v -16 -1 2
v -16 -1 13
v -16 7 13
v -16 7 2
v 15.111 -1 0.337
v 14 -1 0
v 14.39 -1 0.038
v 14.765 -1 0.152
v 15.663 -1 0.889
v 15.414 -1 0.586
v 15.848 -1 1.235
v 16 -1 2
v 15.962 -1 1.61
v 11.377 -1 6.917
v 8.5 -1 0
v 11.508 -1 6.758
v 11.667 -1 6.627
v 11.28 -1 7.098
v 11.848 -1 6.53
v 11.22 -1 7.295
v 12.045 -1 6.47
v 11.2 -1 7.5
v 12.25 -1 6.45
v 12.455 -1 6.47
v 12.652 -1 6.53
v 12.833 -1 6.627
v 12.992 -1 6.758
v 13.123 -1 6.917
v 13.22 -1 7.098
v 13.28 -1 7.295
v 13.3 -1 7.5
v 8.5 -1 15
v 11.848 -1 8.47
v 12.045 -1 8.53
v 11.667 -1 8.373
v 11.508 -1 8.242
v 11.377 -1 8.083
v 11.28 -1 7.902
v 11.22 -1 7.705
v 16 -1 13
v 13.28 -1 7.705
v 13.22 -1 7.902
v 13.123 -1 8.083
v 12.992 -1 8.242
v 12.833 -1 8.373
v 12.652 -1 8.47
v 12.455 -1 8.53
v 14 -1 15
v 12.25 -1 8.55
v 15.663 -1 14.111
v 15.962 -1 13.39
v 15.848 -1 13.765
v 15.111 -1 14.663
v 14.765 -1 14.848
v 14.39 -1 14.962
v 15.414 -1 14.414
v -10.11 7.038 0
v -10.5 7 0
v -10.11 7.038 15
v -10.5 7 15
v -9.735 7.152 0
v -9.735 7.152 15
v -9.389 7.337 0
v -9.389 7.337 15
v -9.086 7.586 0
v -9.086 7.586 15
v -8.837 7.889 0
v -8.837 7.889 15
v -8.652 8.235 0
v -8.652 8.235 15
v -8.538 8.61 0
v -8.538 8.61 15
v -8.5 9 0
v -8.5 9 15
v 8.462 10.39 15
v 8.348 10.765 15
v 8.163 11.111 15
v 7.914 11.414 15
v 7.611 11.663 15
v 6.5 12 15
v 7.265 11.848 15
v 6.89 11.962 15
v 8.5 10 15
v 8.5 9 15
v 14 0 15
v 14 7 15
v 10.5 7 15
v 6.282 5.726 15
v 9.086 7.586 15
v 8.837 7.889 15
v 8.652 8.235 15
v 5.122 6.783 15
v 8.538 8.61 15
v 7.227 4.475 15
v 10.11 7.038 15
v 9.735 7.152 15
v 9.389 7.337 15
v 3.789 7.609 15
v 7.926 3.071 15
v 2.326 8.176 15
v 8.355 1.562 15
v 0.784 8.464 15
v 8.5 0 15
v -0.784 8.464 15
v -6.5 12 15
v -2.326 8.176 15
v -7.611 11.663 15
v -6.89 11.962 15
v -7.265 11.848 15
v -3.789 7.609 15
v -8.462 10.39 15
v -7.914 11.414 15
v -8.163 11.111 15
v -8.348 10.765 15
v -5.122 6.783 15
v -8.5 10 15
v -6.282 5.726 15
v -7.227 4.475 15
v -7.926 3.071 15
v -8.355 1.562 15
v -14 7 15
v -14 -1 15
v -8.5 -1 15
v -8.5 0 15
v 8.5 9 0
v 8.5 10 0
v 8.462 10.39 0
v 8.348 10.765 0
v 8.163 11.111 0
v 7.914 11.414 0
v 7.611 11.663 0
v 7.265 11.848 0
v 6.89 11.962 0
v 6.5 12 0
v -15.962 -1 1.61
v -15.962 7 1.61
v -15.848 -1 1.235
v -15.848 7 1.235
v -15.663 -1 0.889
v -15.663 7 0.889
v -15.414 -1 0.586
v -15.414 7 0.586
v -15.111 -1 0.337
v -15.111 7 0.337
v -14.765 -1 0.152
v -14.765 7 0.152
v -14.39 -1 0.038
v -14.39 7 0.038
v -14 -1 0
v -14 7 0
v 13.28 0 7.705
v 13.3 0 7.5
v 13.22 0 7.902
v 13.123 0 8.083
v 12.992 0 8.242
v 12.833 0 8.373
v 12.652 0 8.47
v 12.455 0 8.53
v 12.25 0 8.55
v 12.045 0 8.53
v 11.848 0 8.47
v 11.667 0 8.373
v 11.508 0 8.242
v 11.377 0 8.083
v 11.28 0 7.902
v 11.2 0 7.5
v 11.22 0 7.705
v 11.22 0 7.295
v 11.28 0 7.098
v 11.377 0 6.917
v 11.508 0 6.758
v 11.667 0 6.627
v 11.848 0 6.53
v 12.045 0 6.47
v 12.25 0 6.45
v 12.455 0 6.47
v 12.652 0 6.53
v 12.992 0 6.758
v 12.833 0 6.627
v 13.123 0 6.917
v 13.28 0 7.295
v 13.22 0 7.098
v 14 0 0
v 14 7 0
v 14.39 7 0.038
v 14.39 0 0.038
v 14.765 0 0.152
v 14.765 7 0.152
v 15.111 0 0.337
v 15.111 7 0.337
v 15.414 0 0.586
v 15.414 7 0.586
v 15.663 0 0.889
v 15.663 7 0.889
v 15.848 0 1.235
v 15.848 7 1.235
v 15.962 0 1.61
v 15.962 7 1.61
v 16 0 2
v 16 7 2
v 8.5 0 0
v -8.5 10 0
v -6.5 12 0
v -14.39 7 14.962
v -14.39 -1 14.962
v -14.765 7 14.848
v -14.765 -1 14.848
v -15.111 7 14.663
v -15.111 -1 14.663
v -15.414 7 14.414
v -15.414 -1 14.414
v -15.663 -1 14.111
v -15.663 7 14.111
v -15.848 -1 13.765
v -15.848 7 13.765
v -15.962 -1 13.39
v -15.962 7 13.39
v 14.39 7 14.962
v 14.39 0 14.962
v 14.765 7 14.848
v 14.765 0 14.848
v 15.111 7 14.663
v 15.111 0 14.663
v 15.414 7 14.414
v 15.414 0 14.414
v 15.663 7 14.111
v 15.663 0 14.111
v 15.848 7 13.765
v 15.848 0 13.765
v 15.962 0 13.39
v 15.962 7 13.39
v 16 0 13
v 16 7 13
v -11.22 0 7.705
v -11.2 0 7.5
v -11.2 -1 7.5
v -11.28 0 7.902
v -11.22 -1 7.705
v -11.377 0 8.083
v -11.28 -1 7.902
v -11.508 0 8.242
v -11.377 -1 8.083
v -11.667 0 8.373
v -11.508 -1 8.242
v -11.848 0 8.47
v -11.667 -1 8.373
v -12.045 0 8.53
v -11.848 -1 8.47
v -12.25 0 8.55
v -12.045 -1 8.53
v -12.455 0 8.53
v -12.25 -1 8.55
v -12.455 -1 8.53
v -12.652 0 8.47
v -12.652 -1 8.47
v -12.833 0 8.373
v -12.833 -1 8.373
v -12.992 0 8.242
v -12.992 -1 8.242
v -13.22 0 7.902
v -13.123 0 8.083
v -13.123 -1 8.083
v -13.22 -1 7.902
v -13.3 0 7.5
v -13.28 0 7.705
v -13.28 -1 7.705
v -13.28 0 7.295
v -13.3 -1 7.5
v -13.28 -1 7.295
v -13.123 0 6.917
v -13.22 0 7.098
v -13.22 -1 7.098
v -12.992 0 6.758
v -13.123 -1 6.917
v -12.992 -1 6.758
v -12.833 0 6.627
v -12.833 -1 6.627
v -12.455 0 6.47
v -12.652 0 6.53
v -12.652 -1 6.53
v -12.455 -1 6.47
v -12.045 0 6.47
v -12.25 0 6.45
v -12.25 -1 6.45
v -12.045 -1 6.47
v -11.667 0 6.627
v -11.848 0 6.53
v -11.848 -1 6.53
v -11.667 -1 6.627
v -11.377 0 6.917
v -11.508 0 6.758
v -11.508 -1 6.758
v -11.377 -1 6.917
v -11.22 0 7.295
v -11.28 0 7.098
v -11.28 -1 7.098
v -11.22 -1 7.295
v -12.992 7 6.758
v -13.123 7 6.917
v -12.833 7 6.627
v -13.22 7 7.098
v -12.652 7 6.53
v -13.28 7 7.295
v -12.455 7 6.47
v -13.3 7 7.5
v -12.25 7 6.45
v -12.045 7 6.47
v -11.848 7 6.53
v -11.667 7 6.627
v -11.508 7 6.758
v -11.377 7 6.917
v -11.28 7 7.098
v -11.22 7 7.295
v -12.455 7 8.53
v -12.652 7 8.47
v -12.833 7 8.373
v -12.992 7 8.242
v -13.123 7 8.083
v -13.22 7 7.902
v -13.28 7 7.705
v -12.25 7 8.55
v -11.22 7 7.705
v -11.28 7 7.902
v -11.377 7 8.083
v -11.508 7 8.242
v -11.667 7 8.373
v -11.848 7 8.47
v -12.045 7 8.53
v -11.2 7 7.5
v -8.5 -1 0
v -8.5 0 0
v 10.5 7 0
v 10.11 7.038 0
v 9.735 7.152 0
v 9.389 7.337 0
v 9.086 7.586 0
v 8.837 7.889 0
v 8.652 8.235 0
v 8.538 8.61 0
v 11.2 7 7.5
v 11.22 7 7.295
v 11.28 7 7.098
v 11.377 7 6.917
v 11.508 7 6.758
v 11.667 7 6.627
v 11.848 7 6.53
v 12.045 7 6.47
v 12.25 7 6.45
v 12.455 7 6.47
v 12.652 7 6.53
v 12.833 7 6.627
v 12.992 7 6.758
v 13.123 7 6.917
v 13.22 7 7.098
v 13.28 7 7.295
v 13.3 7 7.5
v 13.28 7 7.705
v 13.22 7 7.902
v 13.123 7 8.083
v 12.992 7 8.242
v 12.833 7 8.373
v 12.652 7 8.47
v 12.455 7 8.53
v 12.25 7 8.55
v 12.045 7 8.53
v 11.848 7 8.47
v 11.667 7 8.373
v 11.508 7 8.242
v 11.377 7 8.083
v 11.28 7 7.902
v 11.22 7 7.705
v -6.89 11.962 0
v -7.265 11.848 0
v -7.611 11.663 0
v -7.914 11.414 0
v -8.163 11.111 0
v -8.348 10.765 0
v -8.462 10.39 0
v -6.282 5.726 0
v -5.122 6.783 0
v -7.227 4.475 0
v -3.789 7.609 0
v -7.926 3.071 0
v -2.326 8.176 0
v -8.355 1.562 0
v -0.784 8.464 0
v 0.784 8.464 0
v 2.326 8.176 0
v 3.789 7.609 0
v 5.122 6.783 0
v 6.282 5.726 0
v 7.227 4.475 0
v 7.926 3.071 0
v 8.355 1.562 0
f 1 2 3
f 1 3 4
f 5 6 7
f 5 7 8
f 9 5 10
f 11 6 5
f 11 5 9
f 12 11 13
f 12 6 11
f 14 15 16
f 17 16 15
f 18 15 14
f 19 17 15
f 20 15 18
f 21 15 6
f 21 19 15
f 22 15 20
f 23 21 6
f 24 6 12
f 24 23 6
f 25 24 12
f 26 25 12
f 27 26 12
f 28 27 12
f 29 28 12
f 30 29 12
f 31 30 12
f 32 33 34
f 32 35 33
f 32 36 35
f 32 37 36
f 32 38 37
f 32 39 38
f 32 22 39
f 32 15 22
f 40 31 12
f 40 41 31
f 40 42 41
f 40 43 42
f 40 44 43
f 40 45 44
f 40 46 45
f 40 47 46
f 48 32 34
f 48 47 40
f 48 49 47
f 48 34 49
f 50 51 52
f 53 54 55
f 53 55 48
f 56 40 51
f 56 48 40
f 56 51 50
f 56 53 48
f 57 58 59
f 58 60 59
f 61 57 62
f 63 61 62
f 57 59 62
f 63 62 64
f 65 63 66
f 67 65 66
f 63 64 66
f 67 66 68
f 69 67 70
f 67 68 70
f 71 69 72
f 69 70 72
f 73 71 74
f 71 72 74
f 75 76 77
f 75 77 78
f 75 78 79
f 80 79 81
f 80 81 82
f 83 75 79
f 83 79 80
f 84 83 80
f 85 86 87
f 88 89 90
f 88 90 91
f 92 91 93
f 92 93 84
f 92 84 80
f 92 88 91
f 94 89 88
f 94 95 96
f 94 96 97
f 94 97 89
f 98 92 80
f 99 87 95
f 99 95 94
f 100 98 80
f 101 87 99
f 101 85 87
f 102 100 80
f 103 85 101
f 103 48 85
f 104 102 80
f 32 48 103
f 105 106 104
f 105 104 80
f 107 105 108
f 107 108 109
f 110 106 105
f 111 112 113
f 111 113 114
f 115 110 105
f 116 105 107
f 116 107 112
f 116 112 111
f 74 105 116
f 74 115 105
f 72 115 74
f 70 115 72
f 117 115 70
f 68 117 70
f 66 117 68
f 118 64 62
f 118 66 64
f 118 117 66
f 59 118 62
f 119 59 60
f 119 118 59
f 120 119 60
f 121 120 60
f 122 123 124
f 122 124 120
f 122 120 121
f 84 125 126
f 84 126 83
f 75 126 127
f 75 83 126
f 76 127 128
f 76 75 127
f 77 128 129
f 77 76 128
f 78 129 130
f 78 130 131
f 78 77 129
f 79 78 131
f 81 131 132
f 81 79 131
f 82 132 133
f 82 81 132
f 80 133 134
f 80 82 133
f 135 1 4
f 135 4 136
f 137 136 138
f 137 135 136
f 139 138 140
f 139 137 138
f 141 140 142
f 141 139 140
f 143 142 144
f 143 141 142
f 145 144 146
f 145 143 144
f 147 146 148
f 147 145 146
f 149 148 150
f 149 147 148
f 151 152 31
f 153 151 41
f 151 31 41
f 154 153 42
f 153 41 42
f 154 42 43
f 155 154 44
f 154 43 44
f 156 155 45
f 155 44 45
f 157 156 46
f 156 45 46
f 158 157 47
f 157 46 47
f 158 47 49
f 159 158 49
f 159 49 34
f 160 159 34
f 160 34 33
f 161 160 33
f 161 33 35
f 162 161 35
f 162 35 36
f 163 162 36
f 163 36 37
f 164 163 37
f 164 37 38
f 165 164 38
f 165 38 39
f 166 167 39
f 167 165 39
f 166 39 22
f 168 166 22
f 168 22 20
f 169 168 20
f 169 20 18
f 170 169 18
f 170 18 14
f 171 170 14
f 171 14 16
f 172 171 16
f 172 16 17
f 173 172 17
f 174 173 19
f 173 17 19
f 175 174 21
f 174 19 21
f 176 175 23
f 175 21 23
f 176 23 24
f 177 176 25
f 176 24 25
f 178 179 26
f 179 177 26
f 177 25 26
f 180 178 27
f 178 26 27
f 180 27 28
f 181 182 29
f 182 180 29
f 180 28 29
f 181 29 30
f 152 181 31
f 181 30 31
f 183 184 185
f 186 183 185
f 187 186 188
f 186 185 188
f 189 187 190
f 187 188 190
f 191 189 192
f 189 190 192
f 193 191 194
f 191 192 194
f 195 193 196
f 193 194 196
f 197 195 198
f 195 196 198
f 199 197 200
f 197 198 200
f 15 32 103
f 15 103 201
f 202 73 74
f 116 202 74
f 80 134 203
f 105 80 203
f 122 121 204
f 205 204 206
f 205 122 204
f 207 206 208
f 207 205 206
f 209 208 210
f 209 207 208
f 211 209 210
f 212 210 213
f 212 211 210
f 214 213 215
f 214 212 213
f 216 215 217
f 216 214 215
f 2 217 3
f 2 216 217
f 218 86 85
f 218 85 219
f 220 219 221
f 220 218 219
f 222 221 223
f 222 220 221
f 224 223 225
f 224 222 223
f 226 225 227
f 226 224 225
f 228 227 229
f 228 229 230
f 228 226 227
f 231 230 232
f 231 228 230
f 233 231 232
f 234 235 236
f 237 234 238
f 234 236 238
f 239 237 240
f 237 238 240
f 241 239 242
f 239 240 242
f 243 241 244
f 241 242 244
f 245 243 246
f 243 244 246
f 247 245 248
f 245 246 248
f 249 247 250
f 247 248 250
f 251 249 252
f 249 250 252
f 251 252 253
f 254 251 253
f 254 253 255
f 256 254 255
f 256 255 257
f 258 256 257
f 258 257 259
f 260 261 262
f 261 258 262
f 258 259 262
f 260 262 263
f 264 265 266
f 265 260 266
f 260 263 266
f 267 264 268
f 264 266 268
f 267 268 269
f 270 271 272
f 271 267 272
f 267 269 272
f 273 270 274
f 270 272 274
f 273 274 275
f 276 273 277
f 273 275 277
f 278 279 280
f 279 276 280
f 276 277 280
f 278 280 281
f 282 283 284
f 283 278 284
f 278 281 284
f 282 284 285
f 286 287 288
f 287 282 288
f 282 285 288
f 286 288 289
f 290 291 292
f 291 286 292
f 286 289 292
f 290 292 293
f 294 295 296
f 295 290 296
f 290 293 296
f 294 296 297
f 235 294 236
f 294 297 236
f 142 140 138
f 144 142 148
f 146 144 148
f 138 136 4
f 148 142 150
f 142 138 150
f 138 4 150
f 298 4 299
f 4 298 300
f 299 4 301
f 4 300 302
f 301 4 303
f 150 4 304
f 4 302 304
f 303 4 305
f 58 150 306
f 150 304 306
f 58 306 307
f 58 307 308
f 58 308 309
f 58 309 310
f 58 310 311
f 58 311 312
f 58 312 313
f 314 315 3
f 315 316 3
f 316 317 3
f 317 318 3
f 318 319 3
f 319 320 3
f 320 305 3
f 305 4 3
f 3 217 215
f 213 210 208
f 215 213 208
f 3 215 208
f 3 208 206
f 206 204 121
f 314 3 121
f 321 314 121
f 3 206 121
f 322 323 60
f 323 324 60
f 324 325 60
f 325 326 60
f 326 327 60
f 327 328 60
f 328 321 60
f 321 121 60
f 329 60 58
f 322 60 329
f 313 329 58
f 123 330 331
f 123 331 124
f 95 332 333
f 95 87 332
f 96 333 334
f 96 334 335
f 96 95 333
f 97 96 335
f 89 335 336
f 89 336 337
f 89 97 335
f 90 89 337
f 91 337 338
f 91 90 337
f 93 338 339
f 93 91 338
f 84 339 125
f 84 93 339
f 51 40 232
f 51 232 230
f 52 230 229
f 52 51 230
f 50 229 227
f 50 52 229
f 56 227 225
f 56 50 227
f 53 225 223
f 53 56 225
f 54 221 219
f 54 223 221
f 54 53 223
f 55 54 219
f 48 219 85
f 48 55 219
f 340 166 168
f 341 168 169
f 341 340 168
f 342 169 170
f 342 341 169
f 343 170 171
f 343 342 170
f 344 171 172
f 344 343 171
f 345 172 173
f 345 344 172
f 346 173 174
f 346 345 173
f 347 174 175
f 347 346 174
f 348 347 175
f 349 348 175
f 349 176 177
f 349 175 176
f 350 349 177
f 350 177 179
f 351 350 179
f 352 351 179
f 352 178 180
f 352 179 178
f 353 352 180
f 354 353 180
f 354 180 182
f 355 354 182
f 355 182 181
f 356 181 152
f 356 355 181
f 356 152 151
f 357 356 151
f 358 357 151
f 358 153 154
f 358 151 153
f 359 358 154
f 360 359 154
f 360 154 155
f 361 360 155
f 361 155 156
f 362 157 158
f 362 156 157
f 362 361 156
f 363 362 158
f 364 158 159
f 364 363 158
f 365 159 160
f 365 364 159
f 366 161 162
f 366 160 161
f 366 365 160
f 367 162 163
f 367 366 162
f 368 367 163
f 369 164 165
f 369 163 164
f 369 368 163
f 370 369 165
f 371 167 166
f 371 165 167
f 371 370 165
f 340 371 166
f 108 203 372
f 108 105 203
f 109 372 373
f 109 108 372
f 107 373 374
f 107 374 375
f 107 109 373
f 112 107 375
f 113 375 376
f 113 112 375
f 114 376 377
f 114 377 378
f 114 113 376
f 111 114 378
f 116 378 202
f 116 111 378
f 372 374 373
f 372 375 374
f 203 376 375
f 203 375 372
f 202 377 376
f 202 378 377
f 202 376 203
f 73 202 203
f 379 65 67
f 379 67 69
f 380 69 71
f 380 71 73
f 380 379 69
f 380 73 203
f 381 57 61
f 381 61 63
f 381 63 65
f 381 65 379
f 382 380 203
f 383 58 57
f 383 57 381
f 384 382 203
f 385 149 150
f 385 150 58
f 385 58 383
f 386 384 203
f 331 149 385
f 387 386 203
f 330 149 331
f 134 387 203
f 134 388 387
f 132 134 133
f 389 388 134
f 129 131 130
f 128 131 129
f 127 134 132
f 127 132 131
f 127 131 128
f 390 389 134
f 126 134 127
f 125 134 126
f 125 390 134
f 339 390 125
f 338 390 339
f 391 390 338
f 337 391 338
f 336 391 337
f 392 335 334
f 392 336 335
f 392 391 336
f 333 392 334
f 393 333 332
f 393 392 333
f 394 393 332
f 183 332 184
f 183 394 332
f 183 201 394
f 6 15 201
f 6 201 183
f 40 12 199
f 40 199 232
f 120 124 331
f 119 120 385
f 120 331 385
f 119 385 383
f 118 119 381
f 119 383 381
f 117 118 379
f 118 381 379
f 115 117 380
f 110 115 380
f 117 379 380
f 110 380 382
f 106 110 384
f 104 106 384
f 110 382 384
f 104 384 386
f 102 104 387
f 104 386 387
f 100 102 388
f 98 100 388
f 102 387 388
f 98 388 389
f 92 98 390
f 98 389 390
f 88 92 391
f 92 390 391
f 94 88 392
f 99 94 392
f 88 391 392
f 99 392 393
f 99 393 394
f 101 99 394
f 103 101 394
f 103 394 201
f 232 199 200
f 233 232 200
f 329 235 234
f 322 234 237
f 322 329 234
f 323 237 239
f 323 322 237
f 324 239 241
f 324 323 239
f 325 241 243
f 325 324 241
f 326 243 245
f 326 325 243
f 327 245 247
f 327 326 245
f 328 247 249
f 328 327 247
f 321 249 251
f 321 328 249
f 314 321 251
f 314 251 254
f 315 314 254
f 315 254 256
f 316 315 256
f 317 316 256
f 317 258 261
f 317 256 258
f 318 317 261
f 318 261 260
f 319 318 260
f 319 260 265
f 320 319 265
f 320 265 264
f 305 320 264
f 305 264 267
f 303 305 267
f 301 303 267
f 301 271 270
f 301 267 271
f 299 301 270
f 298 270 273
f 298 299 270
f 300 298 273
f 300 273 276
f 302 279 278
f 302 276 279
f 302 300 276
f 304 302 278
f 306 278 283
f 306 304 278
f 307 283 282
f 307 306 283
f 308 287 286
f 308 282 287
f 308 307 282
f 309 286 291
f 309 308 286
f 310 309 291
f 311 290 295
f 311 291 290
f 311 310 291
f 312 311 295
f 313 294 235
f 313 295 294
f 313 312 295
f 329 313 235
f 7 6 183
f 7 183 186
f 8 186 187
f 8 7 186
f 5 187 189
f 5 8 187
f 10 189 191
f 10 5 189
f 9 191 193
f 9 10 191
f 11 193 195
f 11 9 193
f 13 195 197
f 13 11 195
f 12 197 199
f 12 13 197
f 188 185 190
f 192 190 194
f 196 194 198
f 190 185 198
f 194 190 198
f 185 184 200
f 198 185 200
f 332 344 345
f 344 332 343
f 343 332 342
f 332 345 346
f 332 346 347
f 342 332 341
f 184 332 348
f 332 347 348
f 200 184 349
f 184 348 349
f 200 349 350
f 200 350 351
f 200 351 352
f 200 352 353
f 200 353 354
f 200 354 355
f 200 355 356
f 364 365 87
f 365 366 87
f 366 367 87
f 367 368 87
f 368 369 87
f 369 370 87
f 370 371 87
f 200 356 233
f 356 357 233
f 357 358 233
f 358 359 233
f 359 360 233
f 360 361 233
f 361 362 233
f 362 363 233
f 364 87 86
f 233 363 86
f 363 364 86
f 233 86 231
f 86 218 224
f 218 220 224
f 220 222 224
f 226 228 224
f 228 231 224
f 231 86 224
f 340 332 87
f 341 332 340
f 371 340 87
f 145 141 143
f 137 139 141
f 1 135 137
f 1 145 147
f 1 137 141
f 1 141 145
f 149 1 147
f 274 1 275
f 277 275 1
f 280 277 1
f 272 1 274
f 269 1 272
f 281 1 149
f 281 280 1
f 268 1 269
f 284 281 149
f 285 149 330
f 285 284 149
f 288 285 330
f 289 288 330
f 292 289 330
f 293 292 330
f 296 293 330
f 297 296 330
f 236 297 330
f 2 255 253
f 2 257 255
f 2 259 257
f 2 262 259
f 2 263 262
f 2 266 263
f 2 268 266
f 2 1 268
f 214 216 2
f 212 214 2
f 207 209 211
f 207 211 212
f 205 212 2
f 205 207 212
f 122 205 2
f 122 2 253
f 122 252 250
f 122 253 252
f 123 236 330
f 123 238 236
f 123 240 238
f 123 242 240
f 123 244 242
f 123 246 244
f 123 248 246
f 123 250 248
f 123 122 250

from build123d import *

# Parameters (mm, degrees)
BOSS_EXTRUDE1_DEPTH     = 15
CUT_EXTRUDE1_DEPTH      = 26
CUT_EXTRUDE1_DEPTH_BACK = 26
SKETCH2_R               = 1.05
FILLET1_R               = 2
CUT_EXTRUDE2_START      = -7
SKETCH2_3_W             = 7.5
SKETCH2_3_H             = 15
SKETCH2_3_R             = 1.05
CUT_EXTRUDE2_DEPTH      = 5
FILLET2_R               = 2
BOSS_EXTRUDE2_START     = 1
SKETCH3_R               = 1.05
BOSS_EXTRUDE2_DEPTH     = 1


with BuildPart() as part:
    # Sketch1 → Boss-Extrude1 (new body)
    with BuildSketch(Plane.XY):
        with BuildLine():
            Line((-16, 12), (-16, 0))
            Line((-16, 0), (-8.5, 0))
            ThreePointArc((-8.5, 0), (0, 8.5), (8.5, 0))
            Line((8.5, 0), (16, 0))
            Line((16, 0), (16, 12))
            Line((16, 12), (-16, 12))
        make_face()
    extrude(amount=BOSS_EXTRUDE1_DEPTH)

    # Sketch2 → Cut-Extrude1 (cut, two sides: drawn at the far end of the back side and taken through both)
    with BuildSketch(Plane.XZ.offset(-CUT_EXTRUDE1_DEPTH_BACK)):
        with Locations((-12.25, 7.5)):
            Circle(SKETCH2_R)
        with Locations(Location((12.25, 7.5, 0), (0, 0, 180))):
            Circle(SKETCH2_R)
    extrude(amount=CUT_EXTRUDE1_DEPTH + CUT_EXTRUDE1_DEPTH_BACK, mode=Mode.SUBTRACT)

    # Fillet1
    fillet1_edges = [part.edges().sort_by_distance(p)[0] for p in [
        (16, 6, 15),
        (-16, 6, 15),
        (-16, 6, 0),
        (16, 6, 0),
    ]]
    fillet(fillet1_edges, radius=FILLET1_R)

    # Sketch2<3> → Cut-Extrude2 (cut)
    # profile 1 of 2: a face of its own
    with BuildSketch(Plane.XZ.offset(CUT_EXTRUDE2_START)):
        with Locations((-12.25, 7.5)):
            Rectangle(SKETCH2_3_W, SKETCH2_3_H)
        with Locations((-12.25, 7.5)):
            Circle(SKETCH2_3_R, mode=Mode.SUBTRACT)
    # profile 2 of 2: a face of its own
    with BuildSketch(Plane.XZ.offset(CUT_EXTRUDE2_START)):
        with Locations((12.25, 7.5)):
            Rectangle(SKETCH2_3_W, SKETCH2_3_H)
        with Locations((12.25, 7.5)):
            Circle(SKETCH2_3_R, mode=Mode.SUBTRACT)
    extrude(amount=-CUT_EXTRUDE2_DEPTH, mode=Mode.SUBTRACT)

    # Fillet2
    fillet2_edges = [part.edges().sort_by_distance(p)[0] for p in [
        (-8.5, 7, 7.5),
        (-8.5, 12, 7.5),
        (8.5, 7, 7.5),
        (8.5, 12, 7.5),
    ]]
    fillet(fillet2_edges, radius=FILLET2_R)

    # Sketch3 → Boss-Extrude2 (add)
    # profile 1 of 2: a face of its own
    with BuildSketch(Plane.XZ.offset(BOSS_EXTRUDE2_START)):
        with BuildLine():
            Line((-16, 13), (-16, 2))
            ThreePointArc((-16, 2), (-15.414213562, 0.585786438), (-14, 0))
            Line((-14, 0), (-8.5, 0))
            Line((-8.5, 0), (-8.5, 15))
            Line((-8.5, 15), (-14, 15))
            ThreePointArc((-14, 15), (-15.414213562, 14.414213562), (-16, 13))
        make_face()
        with Locations((-12.25, 7.5)):
            Circle(SKETCH3_R, mode=Mode.SUBTRACT)
    # profile 2 of 2: a face of its own
    with BuildSketch(Plane.XZ.offset(BOSS_EXTRUDE2_START)):
        with BuildLine():
            Line((16, 2), (16, 13))
            ThreePointArc((16, 13), (15.414213562, 14.414213562), (14, 15))
            Line((14, 15), (8.5, 15))
            Line((8.5, 15), (8.5, 0))
            Line((8.5, 0), (14, 0))
            ThreePointArc((14, 0), (15.414213562, 0.585786438), (16, 2))
        make_face()
        with Locations((12.25, 7.5)):
            Circle(SKETCH3_R, mode=Mode.SUBTRACT)
    extrude(amount=-BOSS_EXTRUDE2_DEPTH)


solid = part.part
